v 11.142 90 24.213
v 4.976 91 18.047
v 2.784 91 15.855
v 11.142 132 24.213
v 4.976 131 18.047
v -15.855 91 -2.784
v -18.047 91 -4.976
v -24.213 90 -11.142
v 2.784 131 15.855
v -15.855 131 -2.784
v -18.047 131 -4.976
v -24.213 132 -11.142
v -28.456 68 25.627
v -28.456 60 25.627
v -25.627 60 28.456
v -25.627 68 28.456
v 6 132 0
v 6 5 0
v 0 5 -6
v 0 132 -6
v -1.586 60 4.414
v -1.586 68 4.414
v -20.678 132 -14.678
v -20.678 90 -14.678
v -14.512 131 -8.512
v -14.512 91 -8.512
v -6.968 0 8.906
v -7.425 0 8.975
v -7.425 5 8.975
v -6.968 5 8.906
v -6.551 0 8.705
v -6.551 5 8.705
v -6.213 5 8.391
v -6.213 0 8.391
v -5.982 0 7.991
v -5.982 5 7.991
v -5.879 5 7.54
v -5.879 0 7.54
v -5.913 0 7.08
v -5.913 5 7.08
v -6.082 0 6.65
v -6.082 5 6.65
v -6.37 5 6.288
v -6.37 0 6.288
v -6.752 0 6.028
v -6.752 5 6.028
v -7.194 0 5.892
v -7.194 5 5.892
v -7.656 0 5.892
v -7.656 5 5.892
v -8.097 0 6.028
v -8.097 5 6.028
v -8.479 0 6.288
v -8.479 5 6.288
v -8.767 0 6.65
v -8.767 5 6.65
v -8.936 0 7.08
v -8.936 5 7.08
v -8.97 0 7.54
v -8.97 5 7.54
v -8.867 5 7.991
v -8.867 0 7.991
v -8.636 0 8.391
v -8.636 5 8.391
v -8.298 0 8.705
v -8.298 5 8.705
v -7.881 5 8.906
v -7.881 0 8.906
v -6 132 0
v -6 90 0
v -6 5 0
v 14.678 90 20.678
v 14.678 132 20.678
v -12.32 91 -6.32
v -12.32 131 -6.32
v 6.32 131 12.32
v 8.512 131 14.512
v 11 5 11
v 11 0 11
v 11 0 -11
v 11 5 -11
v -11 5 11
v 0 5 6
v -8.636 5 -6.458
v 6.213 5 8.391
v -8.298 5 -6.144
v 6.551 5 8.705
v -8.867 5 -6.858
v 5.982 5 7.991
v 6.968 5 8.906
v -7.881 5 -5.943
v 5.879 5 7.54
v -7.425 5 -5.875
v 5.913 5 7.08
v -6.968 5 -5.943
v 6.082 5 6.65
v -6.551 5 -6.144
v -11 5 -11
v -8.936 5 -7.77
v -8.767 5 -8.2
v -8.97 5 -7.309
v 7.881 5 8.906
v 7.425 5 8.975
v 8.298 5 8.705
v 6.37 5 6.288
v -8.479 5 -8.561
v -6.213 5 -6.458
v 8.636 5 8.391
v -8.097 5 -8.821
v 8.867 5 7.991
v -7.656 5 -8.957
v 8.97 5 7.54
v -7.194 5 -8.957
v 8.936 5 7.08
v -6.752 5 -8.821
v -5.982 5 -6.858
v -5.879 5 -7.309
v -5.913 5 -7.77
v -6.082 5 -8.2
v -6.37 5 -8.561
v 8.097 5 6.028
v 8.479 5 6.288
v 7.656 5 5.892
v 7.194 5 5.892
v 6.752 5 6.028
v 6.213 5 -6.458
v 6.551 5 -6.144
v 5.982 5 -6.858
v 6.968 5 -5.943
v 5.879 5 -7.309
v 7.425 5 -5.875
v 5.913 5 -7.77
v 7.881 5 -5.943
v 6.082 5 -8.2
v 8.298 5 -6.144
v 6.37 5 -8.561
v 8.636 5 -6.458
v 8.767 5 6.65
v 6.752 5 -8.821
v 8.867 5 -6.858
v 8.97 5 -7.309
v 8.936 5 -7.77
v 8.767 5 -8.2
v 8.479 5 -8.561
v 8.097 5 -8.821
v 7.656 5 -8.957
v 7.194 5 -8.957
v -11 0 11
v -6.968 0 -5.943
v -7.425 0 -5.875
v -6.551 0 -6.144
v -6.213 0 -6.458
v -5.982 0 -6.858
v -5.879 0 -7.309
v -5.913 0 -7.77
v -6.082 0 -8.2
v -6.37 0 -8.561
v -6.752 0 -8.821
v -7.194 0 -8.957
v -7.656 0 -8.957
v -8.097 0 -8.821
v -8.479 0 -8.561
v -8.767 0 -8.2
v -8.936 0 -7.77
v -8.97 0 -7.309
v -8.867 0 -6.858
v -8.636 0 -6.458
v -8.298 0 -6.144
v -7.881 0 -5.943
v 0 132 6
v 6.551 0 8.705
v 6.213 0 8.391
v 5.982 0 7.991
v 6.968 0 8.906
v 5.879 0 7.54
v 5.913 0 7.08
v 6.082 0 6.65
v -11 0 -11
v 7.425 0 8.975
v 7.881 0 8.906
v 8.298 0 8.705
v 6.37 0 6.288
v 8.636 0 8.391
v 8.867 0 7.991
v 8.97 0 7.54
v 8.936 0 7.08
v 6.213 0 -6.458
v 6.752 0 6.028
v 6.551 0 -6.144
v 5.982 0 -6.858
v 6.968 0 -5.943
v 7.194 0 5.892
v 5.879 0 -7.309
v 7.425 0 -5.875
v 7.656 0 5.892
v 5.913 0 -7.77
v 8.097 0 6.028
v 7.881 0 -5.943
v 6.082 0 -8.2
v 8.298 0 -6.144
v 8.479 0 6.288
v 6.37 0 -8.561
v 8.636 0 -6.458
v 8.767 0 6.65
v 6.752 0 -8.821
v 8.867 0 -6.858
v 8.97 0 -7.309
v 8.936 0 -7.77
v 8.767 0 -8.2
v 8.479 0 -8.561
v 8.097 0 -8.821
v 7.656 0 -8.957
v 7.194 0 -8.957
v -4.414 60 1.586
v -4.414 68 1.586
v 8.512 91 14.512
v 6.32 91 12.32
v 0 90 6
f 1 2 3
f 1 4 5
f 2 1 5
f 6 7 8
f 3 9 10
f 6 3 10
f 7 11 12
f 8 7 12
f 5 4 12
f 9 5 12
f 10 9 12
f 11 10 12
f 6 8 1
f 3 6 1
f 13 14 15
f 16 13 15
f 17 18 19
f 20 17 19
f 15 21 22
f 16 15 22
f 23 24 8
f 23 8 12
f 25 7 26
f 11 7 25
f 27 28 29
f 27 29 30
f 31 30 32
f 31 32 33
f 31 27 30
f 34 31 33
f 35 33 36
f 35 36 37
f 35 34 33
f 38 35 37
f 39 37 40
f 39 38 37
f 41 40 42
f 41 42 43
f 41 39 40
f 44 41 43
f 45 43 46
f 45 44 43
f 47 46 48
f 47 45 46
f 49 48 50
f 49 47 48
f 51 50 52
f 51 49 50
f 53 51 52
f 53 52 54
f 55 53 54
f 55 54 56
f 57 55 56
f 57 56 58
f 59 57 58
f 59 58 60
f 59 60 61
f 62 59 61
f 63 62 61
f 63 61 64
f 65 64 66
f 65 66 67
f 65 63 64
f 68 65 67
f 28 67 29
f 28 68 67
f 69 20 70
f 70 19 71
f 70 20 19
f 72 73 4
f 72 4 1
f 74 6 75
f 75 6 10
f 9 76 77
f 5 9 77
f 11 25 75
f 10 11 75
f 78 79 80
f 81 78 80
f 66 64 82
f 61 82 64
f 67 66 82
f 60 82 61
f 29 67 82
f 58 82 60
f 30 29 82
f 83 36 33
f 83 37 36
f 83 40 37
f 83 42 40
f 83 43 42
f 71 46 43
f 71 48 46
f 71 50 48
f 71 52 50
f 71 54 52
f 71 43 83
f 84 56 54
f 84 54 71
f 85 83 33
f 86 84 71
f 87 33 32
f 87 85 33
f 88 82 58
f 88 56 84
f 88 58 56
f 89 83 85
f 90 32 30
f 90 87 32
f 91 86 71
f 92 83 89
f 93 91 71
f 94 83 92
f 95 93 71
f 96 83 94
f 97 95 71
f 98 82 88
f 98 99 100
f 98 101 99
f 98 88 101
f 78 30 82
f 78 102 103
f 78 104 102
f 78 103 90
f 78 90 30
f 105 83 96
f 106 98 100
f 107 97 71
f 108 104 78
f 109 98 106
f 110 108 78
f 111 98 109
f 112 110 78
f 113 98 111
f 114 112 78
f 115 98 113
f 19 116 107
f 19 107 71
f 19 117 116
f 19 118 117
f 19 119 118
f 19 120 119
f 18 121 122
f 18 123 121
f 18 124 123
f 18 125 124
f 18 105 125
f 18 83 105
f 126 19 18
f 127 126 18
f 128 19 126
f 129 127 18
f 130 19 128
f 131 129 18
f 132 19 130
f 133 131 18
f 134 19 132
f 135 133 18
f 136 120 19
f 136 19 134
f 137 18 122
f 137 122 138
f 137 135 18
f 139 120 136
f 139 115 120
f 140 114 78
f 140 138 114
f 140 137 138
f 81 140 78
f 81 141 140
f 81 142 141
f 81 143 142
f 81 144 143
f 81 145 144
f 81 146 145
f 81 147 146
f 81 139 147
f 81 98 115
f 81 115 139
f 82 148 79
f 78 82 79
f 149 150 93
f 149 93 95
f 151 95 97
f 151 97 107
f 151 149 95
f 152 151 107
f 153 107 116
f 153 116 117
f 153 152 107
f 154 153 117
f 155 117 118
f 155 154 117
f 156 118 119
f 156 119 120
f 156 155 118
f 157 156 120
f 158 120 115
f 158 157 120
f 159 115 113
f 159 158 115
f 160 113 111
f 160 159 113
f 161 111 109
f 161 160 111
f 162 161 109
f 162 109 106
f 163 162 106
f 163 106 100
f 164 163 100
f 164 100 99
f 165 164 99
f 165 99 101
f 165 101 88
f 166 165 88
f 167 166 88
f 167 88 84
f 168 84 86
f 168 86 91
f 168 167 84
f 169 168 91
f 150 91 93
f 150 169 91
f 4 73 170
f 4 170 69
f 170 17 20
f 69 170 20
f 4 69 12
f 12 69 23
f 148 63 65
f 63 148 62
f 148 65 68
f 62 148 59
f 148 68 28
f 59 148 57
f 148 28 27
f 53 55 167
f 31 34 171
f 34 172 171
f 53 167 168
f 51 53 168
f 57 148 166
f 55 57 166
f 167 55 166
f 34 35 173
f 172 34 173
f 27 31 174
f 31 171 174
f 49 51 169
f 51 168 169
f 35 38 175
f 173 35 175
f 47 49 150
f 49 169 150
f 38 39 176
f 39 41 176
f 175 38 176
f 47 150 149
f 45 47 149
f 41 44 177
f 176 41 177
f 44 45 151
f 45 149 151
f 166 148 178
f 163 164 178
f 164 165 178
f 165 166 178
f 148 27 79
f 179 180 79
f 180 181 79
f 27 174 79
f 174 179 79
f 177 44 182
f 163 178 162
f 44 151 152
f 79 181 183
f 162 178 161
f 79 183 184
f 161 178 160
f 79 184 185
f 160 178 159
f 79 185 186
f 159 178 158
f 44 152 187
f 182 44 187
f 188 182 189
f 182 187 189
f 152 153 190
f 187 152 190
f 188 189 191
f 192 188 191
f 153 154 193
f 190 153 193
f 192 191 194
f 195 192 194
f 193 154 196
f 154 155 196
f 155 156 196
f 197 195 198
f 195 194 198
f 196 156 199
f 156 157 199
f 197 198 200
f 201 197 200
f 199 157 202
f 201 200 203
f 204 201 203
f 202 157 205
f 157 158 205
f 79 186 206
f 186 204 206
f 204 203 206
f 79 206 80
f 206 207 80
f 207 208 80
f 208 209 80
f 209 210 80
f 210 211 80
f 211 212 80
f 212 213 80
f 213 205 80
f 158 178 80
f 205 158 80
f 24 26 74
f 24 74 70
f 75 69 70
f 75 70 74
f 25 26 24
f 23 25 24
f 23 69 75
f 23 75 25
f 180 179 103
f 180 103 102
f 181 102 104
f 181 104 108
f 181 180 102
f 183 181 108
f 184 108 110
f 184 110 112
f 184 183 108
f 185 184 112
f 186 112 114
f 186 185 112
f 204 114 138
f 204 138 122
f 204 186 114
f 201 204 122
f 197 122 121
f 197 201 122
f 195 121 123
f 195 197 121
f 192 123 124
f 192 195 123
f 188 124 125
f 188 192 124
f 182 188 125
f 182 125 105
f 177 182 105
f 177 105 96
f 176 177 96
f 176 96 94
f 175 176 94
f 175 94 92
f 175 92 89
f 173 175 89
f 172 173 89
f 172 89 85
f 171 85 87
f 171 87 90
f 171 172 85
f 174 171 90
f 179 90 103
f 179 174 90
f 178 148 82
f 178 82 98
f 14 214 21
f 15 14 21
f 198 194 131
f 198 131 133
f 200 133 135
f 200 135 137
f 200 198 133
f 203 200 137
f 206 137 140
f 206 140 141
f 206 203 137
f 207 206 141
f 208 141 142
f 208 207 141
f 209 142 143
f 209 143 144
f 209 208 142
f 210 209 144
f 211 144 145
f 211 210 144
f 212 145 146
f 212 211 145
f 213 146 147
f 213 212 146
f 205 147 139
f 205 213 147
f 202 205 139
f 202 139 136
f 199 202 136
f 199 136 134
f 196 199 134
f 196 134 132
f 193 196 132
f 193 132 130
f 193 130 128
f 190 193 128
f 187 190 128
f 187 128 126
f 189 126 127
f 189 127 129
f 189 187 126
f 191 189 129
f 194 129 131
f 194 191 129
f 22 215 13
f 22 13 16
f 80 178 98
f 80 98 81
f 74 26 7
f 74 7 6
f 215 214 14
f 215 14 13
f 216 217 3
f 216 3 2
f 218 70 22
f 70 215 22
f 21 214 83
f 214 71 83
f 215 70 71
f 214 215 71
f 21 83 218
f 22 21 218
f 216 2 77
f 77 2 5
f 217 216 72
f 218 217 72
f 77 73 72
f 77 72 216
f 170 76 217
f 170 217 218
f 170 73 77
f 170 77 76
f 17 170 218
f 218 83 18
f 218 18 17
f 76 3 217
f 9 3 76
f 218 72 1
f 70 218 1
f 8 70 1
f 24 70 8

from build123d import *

# Parameters (mm, degrees)
SKETCH_1_W          = 22
SKETCH_1_H          = 22
SKETCH_1_R          = 1.55
EXTRUDE_1_DEPTH     = 5
EXTRUDE_2_DEPTH     = 127
SKETCH_3_W          = 4
SKETCH_3_H          = 8
EXTRUDE_3_DEPTH     = 34
EXTRUDE_4_DEPTH     = 5
SKETCH_7_W          = 3.1
SKETCH_7_H          = 40
CUT_EXTRUDE_3_DEPTH = 5


with BuildPart() as part:
    # 草图1 → 凸台-拉伸1 (new body)
    with BuildSketch(Plane(origin=(0, 0, 0), x_dir=(1, 0, 0), z_dir=(0, 1, 0))):
        Rectangle(SKETCH_1_W, SKETCH_1_H)
        with Locations(Location((-7.424621202, 7.424621202, 0), (0, 0, 270))):
            Circle(SKETCH_1_R, mode=Mode.SUBTRACT)
        with Locations(Location((7.424621202, 7.424621202, 0), (0, 0, 270))):
            Circle(SKETCH_1_R, mode=Mode.SUBTRACT)
        with Locations(Location((7.424621202, -7.424621202, 0), (0, 0, 270))):
            Circle(SKETCH_1_R, mode=Mode.SUBTRACT)
        with Locations(Location((-7.424621202, -7.424621202, 0), (0, 0, 270))):
            Circle(SKETCH_1_R, mode=Mode.SUBTRACT)
    extrude(amount=EXTRUDE_1_DEPTH)

    # 草图2 → 凸台-拉伸2 (add)
    with BuildSketch(Plane(origin=(0, 5, 0), x_dir=(1, 0, 0), z_dir=(0, 1, 0))):
        Polygon((0, 6), (-6, 0), (0, -6), (6, 0), align=None)
    extrude(amount=EXTRUDE_2_DEPTH)

    # 草图3 → 凸台-拉伸3 (add)
    with BuildSketch(Plane(origin=(-3, 0, 3), x_dir=(0.7071067811865452, 0, 0.7071067811865498), z_dir=(-0.7071067811865498, 0, 0.7071067811865452))):
        with Locations((0, 64)):
            Rectangle(SKETCH_3_W, SKETCH_3_H)
    extrude(amount=EXTRUDE_3_DEPTH)

    # 草图4 → 凸台-拉伸4 (add)
    with BuildSketch(Plane(origin=(-3, 0, 3), x_dir=(0.7071067811865452, 0, 0.7071067811865498), z_dir=(-0.7071067811865498, 0, 0.7071067811865452))):
        Polygon((4.242640687, 132), (25, 132), (25, 90), (-25, 90), (-25, 132), align=None)
    extrude(amount=EXTRUDE_4_DEPTH)

    # 草图7 → 切除-拉伸3 (cut)
    with BuildSketch(Plane(origin=(-6.535533906, 0, 6.535533906), x_dir=(0.7071067811865454, 0, 0.7071067811865498), z_dir=(-0.7071067811865498, 0, 0.7071067811865454))):
        with Locations((-14.73, 111)):
            Rectangle(SKETCH_7_W, SKETCH_7_H)
        with Locations((14.73, 111)):
            Rectangle(SKETCH_7_W, SKETCH_7_H)
    extrude(amount=-CUT_EXTRUDE_3_DEPTH, mode=Mode.SUBTRACT)


solid = part.part
